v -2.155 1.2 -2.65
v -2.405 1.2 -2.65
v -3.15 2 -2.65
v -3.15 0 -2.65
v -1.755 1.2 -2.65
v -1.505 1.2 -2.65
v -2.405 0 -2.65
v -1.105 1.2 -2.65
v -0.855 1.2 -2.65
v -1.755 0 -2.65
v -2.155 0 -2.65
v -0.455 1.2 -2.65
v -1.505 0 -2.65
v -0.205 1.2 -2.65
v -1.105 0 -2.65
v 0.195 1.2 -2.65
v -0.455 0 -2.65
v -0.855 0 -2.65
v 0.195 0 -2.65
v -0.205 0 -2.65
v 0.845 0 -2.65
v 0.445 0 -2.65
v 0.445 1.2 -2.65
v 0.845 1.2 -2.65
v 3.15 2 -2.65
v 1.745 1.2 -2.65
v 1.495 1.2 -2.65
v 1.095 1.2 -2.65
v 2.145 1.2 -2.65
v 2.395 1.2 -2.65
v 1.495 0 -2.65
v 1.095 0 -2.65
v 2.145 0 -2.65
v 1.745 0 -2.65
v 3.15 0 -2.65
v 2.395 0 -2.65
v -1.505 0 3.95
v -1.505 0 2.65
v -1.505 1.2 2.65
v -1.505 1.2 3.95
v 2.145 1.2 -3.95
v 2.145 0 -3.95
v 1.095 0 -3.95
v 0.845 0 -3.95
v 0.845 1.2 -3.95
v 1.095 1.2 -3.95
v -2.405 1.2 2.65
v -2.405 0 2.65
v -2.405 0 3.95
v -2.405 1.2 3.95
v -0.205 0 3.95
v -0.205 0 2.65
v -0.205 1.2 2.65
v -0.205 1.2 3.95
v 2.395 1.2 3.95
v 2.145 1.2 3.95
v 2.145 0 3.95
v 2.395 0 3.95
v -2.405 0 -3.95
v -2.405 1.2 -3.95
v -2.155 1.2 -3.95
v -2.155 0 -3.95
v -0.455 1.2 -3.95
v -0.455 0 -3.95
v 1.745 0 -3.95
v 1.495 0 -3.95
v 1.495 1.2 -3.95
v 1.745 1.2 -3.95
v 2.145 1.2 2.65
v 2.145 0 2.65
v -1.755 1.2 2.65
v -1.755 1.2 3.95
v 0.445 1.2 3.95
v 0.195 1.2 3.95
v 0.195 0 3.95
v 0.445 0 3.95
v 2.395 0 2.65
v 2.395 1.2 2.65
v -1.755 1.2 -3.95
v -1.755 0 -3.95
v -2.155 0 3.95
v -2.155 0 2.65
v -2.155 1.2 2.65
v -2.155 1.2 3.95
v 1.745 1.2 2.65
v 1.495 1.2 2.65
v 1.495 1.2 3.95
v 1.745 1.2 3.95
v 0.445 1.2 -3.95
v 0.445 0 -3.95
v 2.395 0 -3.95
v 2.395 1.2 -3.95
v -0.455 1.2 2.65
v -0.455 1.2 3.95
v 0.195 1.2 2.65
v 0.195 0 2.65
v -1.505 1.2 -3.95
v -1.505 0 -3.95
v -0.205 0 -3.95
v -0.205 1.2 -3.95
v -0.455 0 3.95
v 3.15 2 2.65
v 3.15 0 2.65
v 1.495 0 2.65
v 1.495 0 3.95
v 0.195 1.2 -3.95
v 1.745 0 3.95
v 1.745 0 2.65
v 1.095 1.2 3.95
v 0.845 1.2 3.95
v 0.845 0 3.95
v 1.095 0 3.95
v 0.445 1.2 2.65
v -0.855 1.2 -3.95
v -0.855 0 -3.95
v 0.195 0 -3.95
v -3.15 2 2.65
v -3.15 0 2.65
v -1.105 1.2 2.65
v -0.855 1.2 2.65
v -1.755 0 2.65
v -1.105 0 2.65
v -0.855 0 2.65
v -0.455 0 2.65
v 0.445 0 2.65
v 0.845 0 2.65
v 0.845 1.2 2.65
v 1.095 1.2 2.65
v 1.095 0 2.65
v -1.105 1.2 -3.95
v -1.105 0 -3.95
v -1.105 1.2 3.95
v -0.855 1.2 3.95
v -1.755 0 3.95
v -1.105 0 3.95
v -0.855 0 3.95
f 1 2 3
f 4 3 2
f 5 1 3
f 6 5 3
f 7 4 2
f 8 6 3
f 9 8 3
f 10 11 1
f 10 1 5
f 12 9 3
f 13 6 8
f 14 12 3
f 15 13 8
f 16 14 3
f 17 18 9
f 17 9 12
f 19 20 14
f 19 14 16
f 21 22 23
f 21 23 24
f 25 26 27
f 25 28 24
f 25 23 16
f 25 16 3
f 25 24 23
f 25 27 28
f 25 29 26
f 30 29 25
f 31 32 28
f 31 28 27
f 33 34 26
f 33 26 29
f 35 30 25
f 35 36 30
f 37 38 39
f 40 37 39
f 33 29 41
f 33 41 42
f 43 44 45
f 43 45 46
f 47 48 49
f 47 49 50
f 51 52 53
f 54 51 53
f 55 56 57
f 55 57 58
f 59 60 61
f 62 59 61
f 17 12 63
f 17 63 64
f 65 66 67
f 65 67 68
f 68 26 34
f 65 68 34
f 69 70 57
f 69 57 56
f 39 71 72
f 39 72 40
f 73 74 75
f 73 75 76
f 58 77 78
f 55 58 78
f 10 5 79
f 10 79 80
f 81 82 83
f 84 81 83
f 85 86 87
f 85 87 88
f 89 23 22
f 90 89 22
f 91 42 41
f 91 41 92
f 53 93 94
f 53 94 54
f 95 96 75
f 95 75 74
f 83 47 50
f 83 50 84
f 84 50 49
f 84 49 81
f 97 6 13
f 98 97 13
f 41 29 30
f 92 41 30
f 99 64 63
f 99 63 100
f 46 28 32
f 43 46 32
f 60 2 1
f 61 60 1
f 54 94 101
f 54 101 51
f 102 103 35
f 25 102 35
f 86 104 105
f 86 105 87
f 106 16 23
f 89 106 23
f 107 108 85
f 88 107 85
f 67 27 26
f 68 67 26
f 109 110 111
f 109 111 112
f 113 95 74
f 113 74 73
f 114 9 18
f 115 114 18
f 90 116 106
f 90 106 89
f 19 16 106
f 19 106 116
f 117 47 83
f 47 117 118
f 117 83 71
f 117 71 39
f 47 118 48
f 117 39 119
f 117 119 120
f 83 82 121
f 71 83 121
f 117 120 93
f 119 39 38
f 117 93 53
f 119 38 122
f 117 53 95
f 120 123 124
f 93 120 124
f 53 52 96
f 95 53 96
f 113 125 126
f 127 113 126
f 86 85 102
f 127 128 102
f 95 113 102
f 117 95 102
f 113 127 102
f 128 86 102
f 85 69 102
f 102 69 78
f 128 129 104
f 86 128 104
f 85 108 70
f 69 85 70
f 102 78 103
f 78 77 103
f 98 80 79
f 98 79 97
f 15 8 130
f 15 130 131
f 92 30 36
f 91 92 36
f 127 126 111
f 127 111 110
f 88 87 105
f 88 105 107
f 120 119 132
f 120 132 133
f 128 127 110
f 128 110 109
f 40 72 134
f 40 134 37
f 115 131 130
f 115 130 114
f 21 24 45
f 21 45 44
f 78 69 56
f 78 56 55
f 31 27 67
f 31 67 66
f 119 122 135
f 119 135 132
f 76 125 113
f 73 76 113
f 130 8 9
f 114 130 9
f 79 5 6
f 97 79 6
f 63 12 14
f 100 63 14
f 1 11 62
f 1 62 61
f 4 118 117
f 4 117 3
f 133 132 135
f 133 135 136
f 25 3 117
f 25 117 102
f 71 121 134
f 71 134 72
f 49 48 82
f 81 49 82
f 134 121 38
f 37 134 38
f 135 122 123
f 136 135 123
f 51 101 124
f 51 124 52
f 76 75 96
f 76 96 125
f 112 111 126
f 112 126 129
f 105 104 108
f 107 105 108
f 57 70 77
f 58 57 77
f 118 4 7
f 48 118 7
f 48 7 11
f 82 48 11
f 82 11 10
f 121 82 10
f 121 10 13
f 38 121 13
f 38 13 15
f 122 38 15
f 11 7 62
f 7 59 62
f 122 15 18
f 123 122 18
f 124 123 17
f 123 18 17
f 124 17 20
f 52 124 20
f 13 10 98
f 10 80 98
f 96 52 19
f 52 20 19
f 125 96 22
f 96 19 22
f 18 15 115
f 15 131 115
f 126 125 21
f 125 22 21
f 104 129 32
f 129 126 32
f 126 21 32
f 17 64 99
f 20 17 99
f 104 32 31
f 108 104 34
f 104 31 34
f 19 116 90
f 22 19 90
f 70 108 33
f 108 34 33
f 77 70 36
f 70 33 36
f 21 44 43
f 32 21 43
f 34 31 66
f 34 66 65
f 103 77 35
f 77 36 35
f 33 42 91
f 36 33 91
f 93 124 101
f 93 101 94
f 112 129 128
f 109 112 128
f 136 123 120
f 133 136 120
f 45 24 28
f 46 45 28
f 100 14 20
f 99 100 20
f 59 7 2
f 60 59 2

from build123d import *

# Parameters (mm, degrees)
SKETCH1_W               = 6.3
SKETCH1_H               = 5.3
BOSS_EXTRUDE1_DEPTH     = 2
SKETCH2_W               = 0.25
SKETCH2_H               = 1.2
BOSS_EXTRUDE2_DEPTH     = 1.3
LPATTERN1_COUNT         = 8
LPATTERN1_PITCH         = 0.65
MIRROR1_COPY_1_SKETCH_W = 0.25
MIRROR1_COPY_1_SKETCH_H = 1.2
MIRROR1_COPY_1_DEPTH    = 1.3
MIRROR1_COPY_2_SKETCH_W = 0.25
MIRROR1_COPY_2_SKETCH_H = 1.2
MIRROR1_COPY_2_DEPTH    = 1.3
MIRROR1_COPY_3_SKETCH_W = 0.25
MIRROR1_COPY_3_SKETCH_H = 1.2
MIRROR1_COPY_3_DEPTH    = 1.3
MIRROR1_COPY_4_SKETCH_W = 0.25
MIRROR1_COPY_4_SKETCH_H = 1.2
MIRROR1_COPY_4_DEPTH    = 1.3
MIRROR1_COPY_5_SKETCH_W = 0.25
MIRROR1_COPY_5_SKETCH_H = 1.2
MIRROR1_COPY_5_DEPTH    = 1.3
MIRROR1_COPY_6_SKETCH_W = 0.25
MIRROR1_COPY_6_SKETCH_H = 1.2
MIRROR1_COPY_6_DEPTH    = 1.3
MIRROR1_COPY_7_SKETCH_W = 0.25
MIRROR1_COPY_7_SKETCH_H = 1.2
MIRROR1_COPY_7_DEPTH    = 1.3


with BuildPart() as part:
    # Sketch1 → Boss-Extrude1 (new body)
    with BuildSketch(Plane(origin=(0, 0, 0), x_dir=(1, 0, 0), z_dir=(0, 1, 0))):
        Rectangle(SKETCH1_W, SKETCH1_H)
    extrude(amount=BOSS_EXTRUDE1_DEPTH)

    # Sketch2 → Boss-Extrude2 (add)
    with BuildSketch(Plane.XY.offset(2.65)):
        with Locations((-2.28, 0.6)):
            Rectangle(SKETCH2_W, SKETCH2_H)
    boss_extrude2 = extrude(amount=BOSS_EXTRUDE2_DEPTH)

    # LPattern1: Boss-Extrude2 ×8
    with Locations(*[(i * LPATTERN1_PITCH, 0, 0) for i in range(1, LPATTERN1_COUNT)]):
        add(boss_extrude2)

    # Mirror1: Boss-Extrude2 across plane
    add(boss_extrude2.mirror(Plane.XY))

    # Mirror1 copy 1 sketch → Mirror1 copy 1 (add)
    with BuildSketch(Plane(origin=(0.65, 0, -2.65), x_dir=(1, 0, 0), z_dir=(0, 0, -1))):
        with Locations((-2.28, -0.6)):
            Rectangle(MIRROR1_COPY_1_SKETCH_W, MIRROR1_COPY_1_SKETCH_H)
    extrude(amount=MIRROR1_COPY_1_DEPTH)

    # Mirror1 copy 2 sketch → Mirror1 copy 2 (add)
    with BuildSketch(Plane(origin=(1.3, 0, -2.65), x_dir=(1, 0, 0), z_dir=(0, 0, -1))):
        with Locations((-2.28, -0.6)):
            Rectangle(MIRROR1_COPY_2_SKETCH_W, MIRROR1_COPY_2_SKETCH_H)
    extrude(amount=MIRROR1_COPY_2_DEPTH)

    # Mirror1 copy 3 sketch → Mirror1 copy 3 (add)
    with BuildSketch(Plane(origin=(1.95, 0, -2.65), x_dir=(1, 0, 0), z_dir=(0, 0, -1))):
        with Locations((-2.28, -0.6)):
            Rectangle(MIRROR1_COPY_3_SKETCH_W, MIRROR1_COPY_3_SKETCH_H)
    extrude(amount=MIRROR1_COPY_3_DEPTH)

    # Mirror1 copy 4 sketch → Mirror1 copy 4 (add)
    with BuildSketch(Plane(origin=(2.6, 0, -2.65), x_dir=(1, 0, 0), z_dir=(0, 0, -1))):
        with Locations((-2.28, -0.6)):
            Rectangle(MIRROR1_COPY_4_SKETCH_W, MIRROR1_COPY_4_SKETCH_H)
    extrude(amount=MIRROR1_COPY_4_DEPTH)

    # Mirror1 copy 5 sketch → Mirror1 copy 5 (add)
    with BuildSketch(Plane(origin=(3.25, 0, -2.65), x_dir=(1, 0, 0), z_dir=(0, 0, -1))):
        with Locations((-2.28, -0.6)):
            Rectangle(MIRROR1_COPY_5_SKETCH_W, MIRROR1_COPY_5_SKETCH_H)
    extrude(amount=MIRROR1_COPY_5_DEPTH)

    # Mirror1 copy 6 sketch → Mirror1 copy 6 (add)
    with BuildSketch(Plane(origin=(3.9, 0, -2.65), x_dir=(1, 0, 0), z_dir=(0, 0, -1))):
        with Locations((-2.28, -0.6)):
            Rectangle(MIRROR1_COPY_6_SKETCH_W, MIRROR1_COPY_6_SKETCH_H)
    extrude(amount=MIRROR1_COPY_6_DEPTH)

    # Mirror1 copy 7 sketch → Mirror1 copy 7 (add)
    with BuildSketch(Plane(origin=(4.55, 0, -2.65), x_dir=(1, 0, 0), z_dir=(0, 0, -1))):
        with Locations((-2.28, -0.6)):
            Rectangle(MIRROR1_COPY_7_SKETCH_W, MIRROR1_COPY_7_SKETCH_H)
    extrude(amount=MIRROR1_COPY_7_DEPTH)


solid = part.part
